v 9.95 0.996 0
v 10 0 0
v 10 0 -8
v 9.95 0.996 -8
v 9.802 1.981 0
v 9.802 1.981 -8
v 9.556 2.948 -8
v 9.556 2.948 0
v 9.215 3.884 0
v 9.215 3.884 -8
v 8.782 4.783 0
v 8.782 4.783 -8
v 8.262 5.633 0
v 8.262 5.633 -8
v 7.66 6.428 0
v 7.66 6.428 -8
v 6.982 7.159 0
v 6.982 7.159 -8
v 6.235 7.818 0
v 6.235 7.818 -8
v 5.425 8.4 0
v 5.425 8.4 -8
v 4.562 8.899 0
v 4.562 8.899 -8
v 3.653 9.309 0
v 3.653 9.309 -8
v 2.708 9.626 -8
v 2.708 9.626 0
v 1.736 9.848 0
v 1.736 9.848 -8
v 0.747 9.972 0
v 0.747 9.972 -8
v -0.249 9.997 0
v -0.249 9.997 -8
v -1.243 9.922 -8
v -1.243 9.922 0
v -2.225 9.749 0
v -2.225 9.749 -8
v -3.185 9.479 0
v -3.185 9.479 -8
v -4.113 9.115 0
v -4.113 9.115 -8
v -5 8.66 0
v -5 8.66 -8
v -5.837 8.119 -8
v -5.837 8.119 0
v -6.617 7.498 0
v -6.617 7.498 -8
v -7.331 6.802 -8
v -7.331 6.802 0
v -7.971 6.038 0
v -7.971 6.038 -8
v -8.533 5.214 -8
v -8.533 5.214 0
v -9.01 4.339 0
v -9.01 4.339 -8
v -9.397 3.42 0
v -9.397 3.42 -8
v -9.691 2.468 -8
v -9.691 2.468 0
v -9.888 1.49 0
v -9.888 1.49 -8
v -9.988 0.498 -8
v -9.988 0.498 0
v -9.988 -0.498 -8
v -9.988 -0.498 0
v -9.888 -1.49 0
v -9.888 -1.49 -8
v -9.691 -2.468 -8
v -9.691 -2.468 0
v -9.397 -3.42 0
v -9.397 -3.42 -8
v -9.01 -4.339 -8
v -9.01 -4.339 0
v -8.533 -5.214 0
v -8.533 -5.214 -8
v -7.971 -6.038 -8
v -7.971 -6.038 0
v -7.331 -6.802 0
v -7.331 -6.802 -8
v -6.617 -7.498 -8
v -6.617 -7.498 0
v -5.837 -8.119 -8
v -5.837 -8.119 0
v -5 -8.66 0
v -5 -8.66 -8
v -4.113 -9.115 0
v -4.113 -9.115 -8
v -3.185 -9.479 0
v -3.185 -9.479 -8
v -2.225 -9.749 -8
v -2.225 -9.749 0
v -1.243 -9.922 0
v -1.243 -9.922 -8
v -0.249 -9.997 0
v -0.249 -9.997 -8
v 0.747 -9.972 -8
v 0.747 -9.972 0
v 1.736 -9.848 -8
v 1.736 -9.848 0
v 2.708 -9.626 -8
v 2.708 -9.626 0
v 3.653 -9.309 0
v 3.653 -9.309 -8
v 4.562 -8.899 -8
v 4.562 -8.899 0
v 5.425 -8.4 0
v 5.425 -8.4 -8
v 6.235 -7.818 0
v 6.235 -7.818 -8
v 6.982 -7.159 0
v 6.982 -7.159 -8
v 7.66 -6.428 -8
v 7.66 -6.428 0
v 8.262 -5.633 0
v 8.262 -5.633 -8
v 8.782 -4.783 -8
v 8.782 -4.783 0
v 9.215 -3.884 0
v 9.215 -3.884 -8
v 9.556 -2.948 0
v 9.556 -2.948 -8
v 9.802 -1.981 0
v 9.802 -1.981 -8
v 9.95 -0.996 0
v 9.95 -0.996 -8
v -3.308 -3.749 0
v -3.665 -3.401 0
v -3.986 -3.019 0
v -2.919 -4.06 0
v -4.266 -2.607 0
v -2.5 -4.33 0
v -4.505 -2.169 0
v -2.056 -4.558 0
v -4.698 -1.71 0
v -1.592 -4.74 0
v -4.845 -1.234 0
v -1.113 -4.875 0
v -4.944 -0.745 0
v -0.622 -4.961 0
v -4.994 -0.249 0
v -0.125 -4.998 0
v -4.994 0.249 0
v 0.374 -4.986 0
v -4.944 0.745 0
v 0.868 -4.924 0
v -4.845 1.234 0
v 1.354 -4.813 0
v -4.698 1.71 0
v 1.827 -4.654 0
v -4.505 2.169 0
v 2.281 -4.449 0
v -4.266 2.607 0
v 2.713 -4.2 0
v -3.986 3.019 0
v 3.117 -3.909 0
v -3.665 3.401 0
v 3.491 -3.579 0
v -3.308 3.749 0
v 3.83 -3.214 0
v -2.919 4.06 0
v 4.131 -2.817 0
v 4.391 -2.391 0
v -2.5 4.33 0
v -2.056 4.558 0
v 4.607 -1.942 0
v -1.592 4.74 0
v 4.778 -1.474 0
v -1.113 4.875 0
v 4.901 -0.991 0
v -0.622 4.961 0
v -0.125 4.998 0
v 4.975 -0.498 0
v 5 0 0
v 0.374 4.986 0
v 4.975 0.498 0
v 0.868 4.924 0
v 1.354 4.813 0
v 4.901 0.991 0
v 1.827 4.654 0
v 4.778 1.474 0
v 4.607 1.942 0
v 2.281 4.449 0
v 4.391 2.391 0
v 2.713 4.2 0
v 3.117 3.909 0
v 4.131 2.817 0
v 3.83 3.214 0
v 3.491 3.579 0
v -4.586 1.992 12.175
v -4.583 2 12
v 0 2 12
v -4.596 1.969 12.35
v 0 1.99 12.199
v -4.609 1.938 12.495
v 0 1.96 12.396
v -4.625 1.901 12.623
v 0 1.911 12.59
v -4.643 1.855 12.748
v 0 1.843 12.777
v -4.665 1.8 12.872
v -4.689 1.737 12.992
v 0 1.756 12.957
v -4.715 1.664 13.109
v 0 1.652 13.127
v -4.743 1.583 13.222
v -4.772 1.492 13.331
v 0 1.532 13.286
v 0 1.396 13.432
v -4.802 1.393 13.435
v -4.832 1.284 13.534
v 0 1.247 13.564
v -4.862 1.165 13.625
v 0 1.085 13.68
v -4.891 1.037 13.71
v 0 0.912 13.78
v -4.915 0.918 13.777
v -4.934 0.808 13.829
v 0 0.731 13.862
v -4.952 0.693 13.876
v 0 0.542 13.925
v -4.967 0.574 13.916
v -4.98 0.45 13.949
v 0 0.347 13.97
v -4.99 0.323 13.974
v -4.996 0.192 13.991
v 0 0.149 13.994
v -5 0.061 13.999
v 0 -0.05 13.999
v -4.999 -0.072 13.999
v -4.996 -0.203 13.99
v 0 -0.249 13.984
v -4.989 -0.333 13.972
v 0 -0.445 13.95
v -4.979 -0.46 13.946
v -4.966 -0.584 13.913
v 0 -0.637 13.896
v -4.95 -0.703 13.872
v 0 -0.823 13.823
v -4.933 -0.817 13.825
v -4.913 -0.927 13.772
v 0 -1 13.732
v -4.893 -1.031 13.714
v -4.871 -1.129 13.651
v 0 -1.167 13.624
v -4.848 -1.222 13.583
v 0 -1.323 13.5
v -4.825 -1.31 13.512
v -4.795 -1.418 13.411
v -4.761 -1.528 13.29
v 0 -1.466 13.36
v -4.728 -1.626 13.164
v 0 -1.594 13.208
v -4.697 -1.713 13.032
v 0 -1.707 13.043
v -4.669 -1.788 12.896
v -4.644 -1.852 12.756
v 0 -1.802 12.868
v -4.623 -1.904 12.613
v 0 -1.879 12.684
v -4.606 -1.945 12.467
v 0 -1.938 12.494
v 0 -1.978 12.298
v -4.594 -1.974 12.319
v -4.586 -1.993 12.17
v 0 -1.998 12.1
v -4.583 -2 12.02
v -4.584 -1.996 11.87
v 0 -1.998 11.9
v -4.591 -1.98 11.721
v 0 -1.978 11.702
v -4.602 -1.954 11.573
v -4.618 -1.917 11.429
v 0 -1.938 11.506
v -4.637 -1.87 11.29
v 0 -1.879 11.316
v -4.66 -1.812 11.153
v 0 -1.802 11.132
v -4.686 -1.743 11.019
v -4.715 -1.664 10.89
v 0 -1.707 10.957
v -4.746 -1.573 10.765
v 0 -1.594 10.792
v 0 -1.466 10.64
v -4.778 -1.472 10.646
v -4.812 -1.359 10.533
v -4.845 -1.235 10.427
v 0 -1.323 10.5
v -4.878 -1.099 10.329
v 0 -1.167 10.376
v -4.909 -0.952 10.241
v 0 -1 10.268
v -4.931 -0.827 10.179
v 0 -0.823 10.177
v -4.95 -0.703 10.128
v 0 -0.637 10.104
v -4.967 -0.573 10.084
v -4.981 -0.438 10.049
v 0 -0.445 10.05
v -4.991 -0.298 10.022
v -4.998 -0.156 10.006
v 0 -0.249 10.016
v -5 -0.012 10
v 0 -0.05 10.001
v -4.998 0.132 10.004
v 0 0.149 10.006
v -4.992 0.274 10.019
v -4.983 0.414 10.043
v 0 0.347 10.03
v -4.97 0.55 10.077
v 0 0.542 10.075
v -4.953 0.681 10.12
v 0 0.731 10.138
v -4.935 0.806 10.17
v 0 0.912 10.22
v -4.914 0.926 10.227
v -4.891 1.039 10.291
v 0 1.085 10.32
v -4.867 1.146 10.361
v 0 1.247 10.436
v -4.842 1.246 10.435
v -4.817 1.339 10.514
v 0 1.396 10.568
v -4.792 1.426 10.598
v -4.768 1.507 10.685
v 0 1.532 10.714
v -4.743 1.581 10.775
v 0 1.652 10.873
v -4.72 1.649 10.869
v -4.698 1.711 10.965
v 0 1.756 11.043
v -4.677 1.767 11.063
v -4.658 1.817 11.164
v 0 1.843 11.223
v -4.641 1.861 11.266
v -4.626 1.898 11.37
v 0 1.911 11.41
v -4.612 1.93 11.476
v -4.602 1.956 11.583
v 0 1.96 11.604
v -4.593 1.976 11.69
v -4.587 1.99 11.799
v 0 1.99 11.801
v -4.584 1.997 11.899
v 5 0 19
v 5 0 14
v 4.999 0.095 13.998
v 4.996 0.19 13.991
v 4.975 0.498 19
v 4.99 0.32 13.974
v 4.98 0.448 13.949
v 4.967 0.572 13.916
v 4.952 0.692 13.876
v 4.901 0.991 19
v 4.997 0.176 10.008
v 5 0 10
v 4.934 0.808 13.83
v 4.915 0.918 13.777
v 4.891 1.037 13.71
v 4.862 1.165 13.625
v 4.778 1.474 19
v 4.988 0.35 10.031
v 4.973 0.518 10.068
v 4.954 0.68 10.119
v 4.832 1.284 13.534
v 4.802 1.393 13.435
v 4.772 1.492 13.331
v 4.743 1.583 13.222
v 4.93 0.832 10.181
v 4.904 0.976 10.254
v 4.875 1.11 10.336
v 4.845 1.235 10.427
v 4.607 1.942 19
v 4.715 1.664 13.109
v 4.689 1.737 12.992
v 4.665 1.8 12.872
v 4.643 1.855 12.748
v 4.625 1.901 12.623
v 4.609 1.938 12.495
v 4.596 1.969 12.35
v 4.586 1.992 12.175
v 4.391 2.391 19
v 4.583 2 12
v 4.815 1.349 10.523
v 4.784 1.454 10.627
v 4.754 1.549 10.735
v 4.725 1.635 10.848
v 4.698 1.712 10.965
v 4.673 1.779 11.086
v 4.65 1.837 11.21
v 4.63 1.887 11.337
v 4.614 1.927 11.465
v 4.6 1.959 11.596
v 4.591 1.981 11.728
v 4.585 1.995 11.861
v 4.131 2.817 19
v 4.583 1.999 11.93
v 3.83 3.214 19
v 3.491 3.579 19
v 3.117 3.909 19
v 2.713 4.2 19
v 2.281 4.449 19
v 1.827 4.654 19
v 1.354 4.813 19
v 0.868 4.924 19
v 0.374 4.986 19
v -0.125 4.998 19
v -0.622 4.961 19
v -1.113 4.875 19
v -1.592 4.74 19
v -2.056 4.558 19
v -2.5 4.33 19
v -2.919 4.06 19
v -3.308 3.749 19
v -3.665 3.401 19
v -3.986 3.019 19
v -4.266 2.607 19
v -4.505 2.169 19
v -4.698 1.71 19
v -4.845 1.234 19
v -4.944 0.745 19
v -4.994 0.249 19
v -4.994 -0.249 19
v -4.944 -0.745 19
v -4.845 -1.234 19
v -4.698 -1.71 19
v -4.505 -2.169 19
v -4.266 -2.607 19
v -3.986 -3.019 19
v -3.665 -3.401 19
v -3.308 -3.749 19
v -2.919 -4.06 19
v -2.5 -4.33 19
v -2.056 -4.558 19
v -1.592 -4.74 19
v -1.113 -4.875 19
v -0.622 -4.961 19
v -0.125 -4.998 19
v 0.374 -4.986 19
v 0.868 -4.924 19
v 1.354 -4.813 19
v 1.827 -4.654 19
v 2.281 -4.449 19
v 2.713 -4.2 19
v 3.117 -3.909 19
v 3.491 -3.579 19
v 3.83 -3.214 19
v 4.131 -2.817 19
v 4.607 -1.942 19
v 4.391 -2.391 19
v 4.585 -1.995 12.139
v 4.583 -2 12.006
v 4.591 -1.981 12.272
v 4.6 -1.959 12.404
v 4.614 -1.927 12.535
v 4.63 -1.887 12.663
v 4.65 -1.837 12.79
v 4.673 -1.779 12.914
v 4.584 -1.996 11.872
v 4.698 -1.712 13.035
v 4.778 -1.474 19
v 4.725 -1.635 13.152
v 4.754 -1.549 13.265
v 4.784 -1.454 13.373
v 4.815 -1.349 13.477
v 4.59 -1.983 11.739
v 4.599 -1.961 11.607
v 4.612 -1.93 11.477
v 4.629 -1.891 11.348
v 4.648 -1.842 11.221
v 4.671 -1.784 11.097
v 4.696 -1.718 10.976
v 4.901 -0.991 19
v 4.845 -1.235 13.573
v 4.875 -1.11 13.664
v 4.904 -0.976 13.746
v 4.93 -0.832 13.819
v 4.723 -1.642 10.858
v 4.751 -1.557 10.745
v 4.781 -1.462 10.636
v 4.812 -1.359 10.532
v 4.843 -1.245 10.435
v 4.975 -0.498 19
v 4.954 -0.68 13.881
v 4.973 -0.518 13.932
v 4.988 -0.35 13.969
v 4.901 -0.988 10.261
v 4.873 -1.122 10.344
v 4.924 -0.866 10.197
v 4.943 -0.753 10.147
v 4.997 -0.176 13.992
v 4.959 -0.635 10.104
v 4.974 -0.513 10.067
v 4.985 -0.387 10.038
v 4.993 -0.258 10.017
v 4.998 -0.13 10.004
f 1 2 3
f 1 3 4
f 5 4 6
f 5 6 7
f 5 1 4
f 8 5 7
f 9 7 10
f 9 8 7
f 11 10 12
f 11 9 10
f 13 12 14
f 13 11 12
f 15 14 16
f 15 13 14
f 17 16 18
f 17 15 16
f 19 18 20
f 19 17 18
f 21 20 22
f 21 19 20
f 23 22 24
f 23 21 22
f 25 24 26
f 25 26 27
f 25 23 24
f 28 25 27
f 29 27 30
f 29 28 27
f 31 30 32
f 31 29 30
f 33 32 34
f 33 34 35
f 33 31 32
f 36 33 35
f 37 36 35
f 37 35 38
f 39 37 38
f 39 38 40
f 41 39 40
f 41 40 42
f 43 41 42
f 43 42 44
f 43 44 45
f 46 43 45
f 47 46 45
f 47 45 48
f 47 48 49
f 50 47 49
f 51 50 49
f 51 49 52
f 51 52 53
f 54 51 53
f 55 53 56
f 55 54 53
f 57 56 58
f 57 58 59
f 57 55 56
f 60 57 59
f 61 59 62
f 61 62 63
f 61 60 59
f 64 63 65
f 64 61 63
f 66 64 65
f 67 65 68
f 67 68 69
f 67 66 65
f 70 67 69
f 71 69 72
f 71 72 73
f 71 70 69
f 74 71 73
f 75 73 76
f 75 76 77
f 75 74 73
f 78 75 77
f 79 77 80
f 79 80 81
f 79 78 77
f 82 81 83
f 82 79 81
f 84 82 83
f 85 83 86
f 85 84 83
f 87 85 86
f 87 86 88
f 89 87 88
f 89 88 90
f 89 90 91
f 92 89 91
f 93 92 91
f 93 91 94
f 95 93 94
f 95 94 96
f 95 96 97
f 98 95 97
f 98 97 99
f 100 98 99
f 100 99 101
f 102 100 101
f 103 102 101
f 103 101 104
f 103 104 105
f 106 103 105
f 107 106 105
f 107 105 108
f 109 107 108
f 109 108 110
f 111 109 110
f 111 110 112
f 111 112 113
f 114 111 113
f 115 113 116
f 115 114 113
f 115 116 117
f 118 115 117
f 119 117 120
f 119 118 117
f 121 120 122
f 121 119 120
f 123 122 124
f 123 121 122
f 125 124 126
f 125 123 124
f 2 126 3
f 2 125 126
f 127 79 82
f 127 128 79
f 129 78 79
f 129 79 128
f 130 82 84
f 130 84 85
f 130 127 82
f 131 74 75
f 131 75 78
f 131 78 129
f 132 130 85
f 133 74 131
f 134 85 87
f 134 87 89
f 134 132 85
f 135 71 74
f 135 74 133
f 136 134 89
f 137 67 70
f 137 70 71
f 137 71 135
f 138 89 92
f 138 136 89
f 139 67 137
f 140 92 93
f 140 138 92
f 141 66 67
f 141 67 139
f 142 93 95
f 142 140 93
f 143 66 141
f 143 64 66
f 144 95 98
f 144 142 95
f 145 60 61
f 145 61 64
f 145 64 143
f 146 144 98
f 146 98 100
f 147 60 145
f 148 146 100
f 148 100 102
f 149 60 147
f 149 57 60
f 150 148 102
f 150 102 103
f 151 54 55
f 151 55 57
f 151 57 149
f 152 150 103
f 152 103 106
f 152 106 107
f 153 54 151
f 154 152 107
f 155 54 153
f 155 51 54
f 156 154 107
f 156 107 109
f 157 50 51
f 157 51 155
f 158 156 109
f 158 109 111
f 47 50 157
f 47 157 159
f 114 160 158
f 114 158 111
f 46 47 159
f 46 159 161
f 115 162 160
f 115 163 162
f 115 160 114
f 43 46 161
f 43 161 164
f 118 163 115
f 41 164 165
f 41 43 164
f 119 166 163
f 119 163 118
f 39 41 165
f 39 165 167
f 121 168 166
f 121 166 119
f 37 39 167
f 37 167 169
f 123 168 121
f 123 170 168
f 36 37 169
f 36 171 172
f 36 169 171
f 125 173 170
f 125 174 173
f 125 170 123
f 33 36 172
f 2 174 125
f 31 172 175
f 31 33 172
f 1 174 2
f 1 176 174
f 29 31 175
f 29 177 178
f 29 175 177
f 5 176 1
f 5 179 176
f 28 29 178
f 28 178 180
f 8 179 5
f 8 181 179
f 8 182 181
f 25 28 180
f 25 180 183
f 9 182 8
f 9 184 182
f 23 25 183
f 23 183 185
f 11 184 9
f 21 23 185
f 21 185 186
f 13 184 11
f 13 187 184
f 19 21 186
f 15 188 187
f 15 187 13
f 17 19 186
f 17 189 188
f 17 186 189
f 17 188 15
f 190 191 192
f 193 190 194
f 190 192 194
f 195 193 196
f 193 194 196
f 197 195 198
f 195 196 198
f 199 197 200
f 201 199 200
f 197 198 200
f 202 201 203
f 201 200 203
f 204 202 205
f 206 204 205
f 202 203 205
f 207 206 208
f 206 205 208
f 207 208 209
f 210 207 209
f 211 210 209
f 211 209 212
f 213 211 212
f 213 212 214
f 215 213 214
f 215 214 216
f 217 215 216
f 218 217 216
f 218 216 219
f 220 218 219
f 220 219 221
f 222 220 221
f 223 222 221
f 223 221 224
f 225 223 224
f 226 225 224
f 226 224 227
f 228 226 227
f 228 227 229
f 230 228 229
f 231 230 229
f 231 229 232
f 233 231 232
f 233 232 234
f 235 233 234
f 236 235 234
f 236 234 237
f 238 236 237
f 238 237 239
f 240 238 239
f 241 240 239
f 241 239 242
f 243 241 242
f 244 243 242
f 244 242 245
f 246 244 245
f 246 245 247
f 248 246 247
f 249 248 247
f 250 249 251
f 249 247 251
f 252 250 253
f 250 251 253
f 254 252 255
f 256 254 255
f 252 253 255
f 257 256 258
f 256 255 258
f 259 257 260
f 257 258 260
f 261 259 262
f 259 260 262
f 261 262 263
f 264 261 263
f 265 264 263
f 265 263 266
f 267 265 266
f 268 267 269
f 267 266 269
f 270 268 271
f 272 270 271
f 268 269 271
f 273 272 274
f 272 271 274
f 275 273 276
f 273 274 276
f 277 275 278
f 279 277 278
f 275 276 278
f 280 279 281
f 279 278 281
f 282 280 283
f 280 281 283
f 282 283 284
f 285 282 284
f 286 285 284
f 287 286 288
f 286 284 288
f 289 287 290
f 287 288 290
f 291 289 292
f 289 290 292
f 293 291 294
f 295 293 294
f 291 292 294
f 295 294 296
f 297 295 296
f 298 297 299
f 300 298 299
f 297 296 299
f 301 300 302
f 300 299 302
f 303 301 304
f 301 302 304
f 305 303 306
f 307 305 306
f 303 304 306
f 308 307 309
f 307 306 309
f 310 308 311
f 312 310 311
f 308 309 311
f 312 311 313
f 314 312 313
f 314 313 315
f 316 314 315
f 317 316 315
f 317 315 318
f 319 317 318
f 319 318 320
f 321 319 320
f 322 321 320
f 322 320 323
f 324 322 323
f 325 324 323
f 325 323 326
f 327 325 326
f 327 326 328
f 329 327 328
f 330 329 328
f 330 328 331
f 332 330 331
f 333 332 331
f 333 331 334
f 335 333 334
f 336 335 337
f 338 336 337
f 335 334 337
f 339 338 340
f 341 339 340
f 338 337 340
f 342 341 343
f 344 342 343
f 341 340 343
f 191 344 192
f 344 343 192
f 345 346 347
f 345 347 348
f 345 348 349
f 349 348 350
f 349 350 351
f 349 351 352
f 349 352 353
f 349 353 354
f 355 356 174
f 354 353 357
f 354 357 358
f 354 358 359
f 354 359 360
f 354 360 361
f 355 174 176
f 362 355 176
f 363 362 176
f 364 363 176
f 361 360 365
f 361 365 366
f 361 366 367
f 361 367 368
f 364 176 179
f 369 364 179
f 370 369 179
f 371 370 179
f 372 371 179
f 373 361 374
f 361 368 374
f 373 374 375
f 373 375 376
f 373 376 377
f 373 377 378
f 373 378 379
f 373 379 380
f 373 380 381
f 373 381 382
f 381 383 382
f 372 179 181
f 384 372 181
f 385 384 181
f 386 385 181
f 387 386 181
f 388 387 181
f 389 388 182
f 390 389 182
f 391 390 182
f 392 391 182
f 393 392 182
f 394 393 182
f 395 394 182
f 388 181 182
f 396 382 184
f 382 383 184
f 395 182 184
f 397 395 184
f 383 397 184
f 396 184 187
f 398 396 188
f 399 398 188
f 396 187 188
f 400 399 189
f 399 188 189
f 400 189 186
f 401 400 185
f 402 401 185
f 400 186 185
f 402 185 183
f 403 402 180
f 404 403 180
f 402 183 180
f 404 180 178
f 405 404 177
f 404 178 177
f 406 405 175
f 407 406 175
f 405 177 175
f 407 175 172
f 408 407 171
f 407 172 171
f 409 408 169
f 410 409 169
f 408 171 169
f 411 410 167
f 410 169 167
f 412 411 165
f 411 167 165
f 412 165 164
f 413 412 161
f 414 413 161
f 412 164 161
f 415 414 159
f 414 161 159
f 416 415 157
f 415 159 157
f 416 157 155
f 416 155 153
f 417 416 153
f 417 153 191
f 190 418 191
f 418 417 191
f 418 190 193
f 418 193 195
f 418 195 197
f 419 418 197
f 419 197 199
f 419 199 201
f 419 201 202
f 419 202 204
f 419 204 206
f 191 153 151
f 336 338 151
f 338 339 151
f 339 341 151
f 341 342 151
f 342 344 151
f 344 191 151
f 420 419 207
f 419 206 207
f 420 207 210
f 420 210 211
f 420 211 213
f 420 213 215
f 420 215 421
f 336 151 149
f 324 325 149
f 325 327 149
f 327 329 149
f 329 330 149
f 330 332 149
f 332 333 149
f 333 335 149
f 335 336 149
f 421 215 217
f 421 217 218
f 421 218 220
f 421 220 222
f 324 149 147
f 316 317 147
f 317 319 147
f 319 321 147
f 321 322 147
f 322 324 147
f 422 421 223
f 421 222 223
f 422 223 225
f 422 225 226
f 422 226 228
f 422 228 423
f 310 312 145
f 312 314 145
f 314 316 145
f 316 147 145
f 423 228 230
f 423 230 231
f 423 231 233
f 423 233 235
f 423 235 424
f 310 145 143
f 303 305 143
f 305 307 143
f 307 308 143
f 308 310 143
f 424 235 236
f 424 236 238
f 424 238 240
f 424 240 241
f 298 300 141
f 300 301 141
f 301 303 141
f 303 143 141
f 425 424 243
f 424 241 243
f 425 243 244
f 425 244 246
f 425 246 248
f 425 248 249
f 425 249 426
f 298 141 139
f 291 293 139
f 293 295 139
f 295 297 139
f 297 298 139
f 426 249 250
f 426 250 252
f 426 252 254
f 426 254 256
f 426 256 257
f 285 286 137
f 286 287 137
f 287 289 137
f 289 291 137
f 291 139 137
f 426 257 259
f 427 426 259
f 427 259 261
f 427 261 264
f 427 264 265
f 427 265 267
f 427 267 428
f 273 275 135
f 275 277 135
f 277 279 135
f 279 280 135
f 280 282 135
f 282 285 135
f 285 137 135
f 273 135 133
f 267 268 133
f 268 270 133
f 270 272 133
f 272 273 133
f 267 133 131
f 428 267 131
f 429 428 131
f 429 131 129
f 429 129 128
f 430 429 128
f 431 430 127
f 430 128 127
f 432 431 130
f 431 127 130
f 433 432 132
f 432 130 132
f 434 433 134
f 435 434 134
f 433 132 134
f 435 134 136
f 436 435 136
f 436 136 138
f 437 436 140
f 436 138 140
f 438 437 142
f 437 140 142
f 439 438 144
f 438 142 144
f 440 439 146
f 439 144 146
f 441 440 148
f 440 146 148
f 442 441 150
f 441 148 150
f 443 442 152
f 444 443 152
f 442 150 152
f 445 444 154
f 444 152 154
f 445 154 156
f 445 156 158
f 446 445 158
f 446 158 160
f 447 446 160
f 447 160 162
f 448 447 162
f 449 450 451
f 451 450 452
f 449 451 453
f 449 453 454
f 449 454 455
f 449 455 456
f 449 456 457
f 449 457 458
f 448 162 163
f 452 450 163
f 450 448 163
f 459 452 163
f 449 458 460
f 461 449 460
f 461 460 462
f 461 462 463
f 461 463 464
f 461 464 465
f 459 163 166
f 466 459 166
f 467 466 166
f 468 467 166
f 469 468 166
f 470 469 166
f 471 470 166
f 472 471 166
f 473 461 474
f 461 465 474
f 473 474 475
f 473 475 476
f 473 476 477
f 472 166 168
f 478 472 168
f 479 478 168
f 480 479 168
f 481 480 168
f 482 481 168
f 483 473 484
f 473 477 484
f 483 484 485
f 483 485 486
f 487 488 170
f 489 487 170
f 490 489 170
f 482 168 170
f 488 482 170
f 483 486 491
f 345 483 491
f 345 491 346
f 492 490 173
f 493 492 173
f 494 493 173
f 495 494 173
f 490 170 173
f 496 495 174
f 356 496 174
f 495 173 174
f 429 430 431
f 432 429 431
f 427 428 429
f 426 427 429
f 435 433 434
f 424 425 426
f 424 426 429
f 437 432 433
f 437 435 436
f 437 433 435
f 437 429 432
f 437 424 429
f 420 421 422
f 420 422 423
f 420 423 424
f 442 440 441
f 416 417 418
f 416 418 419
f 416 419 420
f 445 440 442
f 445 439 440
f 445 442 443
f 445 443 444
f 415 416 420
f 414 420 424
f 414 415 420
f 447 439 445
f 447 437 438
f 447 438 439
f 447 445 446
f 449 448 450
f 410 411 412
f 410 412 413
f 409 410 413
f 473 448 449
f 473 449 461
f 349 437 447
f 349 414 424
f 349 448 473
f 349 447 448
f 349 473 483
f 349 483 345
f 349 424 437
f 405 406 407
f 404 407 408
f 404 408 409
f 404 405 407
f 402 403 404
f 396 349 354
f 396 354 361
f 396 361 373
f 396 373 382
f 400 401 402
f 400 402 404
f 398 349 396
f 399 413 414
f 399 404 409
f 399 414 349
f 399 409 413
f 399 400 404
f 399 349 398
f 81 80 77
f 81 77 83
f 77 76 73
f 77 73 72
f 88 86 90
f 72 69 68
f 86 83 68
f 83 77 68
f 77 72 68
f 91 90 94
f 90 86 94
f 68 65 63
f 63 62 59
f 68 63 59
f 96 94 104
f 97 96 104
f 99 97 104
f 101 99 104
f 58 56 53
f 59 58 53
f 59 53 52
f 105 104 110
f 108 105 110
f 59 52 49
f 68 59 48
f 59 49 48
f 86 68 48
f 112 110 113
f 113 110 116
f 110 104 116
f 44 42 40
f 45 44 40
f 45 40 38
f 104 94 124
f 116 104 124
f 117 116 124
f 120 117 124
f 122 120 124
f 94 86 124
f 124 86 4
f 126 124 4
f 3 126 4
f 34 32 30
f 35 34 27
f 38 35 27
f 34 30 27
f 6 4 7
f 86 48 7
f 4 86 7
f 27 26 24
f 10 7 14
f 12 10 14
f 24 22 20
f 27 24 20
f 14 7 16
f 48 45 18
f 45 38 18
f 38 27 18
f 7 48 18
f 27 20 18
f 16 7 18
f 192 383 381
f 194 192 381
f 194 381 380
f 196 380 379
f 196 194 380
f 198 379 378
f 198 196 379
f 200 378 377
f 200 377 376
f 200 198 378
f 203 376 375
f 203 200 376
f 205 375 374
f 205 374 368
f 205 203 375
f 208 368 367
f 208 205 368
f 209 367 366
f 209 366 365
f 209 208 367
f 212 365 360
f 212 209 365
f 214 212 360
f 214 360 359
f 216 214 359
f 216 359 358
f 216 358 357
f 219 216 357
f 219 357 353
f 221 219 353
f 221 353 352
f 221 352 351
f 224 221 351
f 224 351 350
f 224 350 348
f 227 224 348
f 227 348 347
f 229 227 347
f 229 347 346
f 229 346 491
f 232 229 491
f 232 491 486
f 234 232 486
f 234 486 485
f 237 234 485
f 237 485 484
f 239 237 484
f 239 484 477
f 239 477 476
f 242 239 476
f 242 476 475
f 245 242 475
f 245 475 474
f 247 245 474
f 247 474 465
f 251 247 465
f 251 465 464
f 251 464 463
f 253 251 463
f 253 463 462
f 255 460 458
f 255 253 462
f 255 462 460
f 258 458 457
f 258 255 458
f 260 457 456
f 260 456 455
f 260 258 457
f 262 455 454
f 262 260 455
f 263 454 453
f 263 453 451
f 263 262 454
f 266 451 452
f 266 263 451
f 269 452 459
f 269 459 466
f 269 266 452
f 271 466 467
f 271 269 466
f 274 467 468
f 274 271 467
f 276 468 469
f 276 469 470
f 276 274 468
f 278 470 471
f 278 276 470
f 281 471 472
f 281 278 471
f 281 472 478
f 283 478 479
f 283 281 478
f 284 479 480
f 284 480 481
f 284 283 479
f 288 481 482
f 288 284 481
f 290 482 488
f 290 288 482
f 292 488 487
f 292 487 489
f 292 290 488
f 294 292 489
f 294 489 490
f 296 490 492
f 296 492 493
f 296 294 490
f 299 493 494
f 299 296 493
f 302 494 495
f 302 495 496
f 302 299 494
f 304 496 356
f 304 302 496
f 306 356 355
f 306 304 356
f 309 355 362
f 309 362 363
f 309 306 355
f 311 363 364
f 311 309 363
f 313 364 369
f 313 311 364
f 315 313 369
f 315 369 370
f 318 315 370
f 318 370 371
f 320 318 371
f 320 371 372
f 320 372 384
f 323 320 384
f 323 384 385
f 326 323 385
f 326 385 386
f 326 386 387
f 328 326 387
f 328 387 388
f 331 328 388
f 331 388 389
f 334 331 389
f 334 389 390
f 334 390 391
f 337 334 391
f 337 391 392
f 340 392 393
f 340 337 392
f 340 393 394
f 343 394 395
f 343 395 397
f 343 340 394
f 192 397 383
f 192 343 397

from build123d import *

# Parameters (mm, degrees)
SKETCH009_R          = 10
PAD007_DEPTH         = 8
SKETCH010_R          = 5
PAD008_DEPTH         = 19
SKETCH011_R          = 2
POCKET001_DEPTH      = 10.001
POCKET001_DEPTH_BACK = 10.001


with BuildPart() as part:
    # Sketch009 → Pad007 (new body)
    with BuildSketch(Plane.XY):
        Circle(SKETCH009_R)
    extrude(amount=-PAD007_DEPTH)

    # Sketch010 → Pad008 (join)
    with BuildSketch(Plane.XY):
        Circle(SKETCH010_R)
    extrude(amount=PAD008_DEPTH)

    # Sketch011 → Pocket001 (cut, two sides)
    with BuildSketch(Plane.YZ) as pocket001_sk:
        with Locations((0, 12)):
            Circle(SKETCH011_R)
    extrude(amount=-POCKET001_DEPTH, mode=Mode.SUBTRACT)
    extrude(pocket001_sk.sketch, amount=POCKET001_DEPTH_BACK, mode=Mode.SUBTRACT)


solid = part.part
